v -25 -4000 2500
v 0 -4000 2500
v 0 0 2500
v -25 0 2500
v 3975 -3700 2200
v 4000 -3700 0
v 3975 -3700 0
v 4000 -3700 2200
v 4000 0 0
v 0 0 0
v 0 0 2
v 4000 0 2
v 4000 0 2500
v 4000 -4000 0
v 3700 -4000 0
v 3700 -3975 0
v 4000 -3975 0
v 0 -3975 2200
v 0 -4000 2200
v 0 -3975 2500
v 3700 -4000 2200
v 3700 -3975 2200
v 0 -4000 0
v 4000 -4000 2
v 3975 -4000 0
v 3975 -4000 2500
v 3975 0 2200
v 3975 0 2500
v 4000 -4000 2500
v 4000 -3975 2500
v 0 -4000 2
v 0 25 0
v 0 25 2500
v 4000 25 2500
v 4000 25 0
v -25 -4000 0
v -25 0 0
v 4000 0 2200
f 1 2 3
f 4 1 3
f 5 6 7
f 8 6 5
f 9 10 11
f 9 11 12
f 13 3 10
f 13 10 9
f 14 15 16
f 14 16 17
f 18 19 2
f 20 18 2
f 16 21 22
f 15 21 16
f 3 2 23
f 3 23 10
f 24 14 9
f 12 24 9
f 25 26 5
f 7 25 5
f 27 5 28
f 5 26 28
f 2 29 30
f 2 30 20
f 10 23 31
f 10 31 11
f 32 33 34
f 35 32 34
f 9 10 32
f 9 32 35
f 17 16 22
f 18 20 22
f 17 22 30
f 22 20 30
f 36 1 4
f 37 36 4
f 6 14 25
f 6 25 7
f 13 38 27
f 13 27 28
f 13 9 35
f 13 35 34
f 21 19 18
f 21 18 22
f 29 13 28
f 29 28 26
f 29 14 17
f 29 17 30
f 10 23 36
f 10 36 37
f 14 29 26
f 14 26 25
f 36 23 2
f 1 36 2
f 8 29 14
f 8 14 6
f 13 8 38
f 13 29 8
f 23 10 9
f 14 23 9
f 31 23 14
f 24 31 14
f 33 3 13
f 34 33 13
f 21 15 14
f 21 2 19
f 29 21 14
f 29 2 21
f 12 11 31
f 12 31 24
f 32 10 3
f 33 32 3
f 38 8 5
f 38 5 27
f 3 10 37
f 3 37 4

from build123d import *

# Parameters (mm, degrees)
F2_W      = 4000
F2_H      = 4000
F3_DEPTH  = 2
F1_W      = 4000
F1_H      = 2500
F4_DEPTH  = 25
F0_W      = 4000
F0_H      = 2500
F5_DEPTH  = 25
F8_W      = 300
F8_H      = 2200
F8_H_2    = 300
F8_W_2    = 3700
F9_DEPTH  = 25
F10_W     = 3700
F10_H     = 300
F10_W_2   = 300
F10_H_2   = 2200
F11_DEPTH = 25


with BuildPart() as f3:
    # F2 (on Top) → F3 (new body)
    with BuildSketch(Plane.XY):
        with Locations((2000, -2000)):
            Rectangle(F2_W, F2_H)
    extrude(amount=F3_DEPTH)


with BuildPart() as f4:
    # F1 (on Right) → F4 (new body)
    with BuildSketch(Plane.YZ):
        with Locations((-2000, 1250)):
            Rectangle(F1_W, F1_H)
    extrude(amount=-F4_DEPTH)


with BuildPart() as f5:
    # F0 (on Front) → F5 (new body)
    with BuildSketch(Plane.XZ):
        with Locations((2000, 1250)):
            Rectangle(F0_W, F0_H)
    extrude(amount=-F5_DEPTH)


with BuildPart() as f9:
    # F8 (on offset) → F9 (new body)
    with BuildSketch(Plane.XZ.offset(4000)):
        with Locations((3850, 1100)):
            Rectangle(F8_W, F8_H)
        with Locations((3850, 2350)):
            Rectangle(F8_W, F8_H_2)
        with Locations((1850, 2350)):
            Rectangle(F8_W_2, F8_H_2)
    extrude(amount=-F9_DEPTH)


with BuildPart() as f11:
    # F10 (on offset) → F11 (new body)
    with BuildSketch(Plane.YZ.offset(4000)):
        with Locations((-1850, 2350)):
            Rectangle(F10_W, F10_H)
        with Locations((-3850, 2350)):
            Rectangle(F10_W_2, F10_H)
        with Locations((-3850, 1100)):
            Rectangle(F10_W_2, F10_H_2)
    extrude(amount=-F11_DEPTH)


solid = Compound([f3.part, f4.part, f5.part, f9.part, f11.part])
